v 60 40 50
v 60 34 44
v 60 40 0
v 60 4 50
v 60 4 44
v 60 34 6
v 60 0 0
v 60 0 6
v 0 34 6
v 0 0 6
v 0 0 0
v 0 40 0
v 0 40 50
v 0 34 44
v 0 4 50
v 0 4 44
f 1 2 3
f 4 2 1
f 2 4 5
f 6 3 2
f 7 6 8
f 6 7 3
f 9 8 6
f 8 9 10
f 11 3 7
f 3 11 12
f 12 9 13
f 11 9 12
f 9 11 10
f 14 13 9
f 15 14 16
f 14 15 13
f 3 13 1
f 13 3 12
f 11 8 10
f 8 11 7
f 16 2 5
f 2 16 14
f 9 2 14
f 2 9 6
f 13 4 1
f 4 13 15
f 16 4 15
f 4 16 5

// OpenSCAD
union() {
  union() {
    cube([60, 40, 6]);
    translate([0, 34, 0]) {
      cube([60, 6, 44]);
    }
  }
  translate([0, 0, 44]) {
    translate([0, 4, 0]) {
      cube([60, 36, 6]);
    }
  }
}
$fn = 50;
